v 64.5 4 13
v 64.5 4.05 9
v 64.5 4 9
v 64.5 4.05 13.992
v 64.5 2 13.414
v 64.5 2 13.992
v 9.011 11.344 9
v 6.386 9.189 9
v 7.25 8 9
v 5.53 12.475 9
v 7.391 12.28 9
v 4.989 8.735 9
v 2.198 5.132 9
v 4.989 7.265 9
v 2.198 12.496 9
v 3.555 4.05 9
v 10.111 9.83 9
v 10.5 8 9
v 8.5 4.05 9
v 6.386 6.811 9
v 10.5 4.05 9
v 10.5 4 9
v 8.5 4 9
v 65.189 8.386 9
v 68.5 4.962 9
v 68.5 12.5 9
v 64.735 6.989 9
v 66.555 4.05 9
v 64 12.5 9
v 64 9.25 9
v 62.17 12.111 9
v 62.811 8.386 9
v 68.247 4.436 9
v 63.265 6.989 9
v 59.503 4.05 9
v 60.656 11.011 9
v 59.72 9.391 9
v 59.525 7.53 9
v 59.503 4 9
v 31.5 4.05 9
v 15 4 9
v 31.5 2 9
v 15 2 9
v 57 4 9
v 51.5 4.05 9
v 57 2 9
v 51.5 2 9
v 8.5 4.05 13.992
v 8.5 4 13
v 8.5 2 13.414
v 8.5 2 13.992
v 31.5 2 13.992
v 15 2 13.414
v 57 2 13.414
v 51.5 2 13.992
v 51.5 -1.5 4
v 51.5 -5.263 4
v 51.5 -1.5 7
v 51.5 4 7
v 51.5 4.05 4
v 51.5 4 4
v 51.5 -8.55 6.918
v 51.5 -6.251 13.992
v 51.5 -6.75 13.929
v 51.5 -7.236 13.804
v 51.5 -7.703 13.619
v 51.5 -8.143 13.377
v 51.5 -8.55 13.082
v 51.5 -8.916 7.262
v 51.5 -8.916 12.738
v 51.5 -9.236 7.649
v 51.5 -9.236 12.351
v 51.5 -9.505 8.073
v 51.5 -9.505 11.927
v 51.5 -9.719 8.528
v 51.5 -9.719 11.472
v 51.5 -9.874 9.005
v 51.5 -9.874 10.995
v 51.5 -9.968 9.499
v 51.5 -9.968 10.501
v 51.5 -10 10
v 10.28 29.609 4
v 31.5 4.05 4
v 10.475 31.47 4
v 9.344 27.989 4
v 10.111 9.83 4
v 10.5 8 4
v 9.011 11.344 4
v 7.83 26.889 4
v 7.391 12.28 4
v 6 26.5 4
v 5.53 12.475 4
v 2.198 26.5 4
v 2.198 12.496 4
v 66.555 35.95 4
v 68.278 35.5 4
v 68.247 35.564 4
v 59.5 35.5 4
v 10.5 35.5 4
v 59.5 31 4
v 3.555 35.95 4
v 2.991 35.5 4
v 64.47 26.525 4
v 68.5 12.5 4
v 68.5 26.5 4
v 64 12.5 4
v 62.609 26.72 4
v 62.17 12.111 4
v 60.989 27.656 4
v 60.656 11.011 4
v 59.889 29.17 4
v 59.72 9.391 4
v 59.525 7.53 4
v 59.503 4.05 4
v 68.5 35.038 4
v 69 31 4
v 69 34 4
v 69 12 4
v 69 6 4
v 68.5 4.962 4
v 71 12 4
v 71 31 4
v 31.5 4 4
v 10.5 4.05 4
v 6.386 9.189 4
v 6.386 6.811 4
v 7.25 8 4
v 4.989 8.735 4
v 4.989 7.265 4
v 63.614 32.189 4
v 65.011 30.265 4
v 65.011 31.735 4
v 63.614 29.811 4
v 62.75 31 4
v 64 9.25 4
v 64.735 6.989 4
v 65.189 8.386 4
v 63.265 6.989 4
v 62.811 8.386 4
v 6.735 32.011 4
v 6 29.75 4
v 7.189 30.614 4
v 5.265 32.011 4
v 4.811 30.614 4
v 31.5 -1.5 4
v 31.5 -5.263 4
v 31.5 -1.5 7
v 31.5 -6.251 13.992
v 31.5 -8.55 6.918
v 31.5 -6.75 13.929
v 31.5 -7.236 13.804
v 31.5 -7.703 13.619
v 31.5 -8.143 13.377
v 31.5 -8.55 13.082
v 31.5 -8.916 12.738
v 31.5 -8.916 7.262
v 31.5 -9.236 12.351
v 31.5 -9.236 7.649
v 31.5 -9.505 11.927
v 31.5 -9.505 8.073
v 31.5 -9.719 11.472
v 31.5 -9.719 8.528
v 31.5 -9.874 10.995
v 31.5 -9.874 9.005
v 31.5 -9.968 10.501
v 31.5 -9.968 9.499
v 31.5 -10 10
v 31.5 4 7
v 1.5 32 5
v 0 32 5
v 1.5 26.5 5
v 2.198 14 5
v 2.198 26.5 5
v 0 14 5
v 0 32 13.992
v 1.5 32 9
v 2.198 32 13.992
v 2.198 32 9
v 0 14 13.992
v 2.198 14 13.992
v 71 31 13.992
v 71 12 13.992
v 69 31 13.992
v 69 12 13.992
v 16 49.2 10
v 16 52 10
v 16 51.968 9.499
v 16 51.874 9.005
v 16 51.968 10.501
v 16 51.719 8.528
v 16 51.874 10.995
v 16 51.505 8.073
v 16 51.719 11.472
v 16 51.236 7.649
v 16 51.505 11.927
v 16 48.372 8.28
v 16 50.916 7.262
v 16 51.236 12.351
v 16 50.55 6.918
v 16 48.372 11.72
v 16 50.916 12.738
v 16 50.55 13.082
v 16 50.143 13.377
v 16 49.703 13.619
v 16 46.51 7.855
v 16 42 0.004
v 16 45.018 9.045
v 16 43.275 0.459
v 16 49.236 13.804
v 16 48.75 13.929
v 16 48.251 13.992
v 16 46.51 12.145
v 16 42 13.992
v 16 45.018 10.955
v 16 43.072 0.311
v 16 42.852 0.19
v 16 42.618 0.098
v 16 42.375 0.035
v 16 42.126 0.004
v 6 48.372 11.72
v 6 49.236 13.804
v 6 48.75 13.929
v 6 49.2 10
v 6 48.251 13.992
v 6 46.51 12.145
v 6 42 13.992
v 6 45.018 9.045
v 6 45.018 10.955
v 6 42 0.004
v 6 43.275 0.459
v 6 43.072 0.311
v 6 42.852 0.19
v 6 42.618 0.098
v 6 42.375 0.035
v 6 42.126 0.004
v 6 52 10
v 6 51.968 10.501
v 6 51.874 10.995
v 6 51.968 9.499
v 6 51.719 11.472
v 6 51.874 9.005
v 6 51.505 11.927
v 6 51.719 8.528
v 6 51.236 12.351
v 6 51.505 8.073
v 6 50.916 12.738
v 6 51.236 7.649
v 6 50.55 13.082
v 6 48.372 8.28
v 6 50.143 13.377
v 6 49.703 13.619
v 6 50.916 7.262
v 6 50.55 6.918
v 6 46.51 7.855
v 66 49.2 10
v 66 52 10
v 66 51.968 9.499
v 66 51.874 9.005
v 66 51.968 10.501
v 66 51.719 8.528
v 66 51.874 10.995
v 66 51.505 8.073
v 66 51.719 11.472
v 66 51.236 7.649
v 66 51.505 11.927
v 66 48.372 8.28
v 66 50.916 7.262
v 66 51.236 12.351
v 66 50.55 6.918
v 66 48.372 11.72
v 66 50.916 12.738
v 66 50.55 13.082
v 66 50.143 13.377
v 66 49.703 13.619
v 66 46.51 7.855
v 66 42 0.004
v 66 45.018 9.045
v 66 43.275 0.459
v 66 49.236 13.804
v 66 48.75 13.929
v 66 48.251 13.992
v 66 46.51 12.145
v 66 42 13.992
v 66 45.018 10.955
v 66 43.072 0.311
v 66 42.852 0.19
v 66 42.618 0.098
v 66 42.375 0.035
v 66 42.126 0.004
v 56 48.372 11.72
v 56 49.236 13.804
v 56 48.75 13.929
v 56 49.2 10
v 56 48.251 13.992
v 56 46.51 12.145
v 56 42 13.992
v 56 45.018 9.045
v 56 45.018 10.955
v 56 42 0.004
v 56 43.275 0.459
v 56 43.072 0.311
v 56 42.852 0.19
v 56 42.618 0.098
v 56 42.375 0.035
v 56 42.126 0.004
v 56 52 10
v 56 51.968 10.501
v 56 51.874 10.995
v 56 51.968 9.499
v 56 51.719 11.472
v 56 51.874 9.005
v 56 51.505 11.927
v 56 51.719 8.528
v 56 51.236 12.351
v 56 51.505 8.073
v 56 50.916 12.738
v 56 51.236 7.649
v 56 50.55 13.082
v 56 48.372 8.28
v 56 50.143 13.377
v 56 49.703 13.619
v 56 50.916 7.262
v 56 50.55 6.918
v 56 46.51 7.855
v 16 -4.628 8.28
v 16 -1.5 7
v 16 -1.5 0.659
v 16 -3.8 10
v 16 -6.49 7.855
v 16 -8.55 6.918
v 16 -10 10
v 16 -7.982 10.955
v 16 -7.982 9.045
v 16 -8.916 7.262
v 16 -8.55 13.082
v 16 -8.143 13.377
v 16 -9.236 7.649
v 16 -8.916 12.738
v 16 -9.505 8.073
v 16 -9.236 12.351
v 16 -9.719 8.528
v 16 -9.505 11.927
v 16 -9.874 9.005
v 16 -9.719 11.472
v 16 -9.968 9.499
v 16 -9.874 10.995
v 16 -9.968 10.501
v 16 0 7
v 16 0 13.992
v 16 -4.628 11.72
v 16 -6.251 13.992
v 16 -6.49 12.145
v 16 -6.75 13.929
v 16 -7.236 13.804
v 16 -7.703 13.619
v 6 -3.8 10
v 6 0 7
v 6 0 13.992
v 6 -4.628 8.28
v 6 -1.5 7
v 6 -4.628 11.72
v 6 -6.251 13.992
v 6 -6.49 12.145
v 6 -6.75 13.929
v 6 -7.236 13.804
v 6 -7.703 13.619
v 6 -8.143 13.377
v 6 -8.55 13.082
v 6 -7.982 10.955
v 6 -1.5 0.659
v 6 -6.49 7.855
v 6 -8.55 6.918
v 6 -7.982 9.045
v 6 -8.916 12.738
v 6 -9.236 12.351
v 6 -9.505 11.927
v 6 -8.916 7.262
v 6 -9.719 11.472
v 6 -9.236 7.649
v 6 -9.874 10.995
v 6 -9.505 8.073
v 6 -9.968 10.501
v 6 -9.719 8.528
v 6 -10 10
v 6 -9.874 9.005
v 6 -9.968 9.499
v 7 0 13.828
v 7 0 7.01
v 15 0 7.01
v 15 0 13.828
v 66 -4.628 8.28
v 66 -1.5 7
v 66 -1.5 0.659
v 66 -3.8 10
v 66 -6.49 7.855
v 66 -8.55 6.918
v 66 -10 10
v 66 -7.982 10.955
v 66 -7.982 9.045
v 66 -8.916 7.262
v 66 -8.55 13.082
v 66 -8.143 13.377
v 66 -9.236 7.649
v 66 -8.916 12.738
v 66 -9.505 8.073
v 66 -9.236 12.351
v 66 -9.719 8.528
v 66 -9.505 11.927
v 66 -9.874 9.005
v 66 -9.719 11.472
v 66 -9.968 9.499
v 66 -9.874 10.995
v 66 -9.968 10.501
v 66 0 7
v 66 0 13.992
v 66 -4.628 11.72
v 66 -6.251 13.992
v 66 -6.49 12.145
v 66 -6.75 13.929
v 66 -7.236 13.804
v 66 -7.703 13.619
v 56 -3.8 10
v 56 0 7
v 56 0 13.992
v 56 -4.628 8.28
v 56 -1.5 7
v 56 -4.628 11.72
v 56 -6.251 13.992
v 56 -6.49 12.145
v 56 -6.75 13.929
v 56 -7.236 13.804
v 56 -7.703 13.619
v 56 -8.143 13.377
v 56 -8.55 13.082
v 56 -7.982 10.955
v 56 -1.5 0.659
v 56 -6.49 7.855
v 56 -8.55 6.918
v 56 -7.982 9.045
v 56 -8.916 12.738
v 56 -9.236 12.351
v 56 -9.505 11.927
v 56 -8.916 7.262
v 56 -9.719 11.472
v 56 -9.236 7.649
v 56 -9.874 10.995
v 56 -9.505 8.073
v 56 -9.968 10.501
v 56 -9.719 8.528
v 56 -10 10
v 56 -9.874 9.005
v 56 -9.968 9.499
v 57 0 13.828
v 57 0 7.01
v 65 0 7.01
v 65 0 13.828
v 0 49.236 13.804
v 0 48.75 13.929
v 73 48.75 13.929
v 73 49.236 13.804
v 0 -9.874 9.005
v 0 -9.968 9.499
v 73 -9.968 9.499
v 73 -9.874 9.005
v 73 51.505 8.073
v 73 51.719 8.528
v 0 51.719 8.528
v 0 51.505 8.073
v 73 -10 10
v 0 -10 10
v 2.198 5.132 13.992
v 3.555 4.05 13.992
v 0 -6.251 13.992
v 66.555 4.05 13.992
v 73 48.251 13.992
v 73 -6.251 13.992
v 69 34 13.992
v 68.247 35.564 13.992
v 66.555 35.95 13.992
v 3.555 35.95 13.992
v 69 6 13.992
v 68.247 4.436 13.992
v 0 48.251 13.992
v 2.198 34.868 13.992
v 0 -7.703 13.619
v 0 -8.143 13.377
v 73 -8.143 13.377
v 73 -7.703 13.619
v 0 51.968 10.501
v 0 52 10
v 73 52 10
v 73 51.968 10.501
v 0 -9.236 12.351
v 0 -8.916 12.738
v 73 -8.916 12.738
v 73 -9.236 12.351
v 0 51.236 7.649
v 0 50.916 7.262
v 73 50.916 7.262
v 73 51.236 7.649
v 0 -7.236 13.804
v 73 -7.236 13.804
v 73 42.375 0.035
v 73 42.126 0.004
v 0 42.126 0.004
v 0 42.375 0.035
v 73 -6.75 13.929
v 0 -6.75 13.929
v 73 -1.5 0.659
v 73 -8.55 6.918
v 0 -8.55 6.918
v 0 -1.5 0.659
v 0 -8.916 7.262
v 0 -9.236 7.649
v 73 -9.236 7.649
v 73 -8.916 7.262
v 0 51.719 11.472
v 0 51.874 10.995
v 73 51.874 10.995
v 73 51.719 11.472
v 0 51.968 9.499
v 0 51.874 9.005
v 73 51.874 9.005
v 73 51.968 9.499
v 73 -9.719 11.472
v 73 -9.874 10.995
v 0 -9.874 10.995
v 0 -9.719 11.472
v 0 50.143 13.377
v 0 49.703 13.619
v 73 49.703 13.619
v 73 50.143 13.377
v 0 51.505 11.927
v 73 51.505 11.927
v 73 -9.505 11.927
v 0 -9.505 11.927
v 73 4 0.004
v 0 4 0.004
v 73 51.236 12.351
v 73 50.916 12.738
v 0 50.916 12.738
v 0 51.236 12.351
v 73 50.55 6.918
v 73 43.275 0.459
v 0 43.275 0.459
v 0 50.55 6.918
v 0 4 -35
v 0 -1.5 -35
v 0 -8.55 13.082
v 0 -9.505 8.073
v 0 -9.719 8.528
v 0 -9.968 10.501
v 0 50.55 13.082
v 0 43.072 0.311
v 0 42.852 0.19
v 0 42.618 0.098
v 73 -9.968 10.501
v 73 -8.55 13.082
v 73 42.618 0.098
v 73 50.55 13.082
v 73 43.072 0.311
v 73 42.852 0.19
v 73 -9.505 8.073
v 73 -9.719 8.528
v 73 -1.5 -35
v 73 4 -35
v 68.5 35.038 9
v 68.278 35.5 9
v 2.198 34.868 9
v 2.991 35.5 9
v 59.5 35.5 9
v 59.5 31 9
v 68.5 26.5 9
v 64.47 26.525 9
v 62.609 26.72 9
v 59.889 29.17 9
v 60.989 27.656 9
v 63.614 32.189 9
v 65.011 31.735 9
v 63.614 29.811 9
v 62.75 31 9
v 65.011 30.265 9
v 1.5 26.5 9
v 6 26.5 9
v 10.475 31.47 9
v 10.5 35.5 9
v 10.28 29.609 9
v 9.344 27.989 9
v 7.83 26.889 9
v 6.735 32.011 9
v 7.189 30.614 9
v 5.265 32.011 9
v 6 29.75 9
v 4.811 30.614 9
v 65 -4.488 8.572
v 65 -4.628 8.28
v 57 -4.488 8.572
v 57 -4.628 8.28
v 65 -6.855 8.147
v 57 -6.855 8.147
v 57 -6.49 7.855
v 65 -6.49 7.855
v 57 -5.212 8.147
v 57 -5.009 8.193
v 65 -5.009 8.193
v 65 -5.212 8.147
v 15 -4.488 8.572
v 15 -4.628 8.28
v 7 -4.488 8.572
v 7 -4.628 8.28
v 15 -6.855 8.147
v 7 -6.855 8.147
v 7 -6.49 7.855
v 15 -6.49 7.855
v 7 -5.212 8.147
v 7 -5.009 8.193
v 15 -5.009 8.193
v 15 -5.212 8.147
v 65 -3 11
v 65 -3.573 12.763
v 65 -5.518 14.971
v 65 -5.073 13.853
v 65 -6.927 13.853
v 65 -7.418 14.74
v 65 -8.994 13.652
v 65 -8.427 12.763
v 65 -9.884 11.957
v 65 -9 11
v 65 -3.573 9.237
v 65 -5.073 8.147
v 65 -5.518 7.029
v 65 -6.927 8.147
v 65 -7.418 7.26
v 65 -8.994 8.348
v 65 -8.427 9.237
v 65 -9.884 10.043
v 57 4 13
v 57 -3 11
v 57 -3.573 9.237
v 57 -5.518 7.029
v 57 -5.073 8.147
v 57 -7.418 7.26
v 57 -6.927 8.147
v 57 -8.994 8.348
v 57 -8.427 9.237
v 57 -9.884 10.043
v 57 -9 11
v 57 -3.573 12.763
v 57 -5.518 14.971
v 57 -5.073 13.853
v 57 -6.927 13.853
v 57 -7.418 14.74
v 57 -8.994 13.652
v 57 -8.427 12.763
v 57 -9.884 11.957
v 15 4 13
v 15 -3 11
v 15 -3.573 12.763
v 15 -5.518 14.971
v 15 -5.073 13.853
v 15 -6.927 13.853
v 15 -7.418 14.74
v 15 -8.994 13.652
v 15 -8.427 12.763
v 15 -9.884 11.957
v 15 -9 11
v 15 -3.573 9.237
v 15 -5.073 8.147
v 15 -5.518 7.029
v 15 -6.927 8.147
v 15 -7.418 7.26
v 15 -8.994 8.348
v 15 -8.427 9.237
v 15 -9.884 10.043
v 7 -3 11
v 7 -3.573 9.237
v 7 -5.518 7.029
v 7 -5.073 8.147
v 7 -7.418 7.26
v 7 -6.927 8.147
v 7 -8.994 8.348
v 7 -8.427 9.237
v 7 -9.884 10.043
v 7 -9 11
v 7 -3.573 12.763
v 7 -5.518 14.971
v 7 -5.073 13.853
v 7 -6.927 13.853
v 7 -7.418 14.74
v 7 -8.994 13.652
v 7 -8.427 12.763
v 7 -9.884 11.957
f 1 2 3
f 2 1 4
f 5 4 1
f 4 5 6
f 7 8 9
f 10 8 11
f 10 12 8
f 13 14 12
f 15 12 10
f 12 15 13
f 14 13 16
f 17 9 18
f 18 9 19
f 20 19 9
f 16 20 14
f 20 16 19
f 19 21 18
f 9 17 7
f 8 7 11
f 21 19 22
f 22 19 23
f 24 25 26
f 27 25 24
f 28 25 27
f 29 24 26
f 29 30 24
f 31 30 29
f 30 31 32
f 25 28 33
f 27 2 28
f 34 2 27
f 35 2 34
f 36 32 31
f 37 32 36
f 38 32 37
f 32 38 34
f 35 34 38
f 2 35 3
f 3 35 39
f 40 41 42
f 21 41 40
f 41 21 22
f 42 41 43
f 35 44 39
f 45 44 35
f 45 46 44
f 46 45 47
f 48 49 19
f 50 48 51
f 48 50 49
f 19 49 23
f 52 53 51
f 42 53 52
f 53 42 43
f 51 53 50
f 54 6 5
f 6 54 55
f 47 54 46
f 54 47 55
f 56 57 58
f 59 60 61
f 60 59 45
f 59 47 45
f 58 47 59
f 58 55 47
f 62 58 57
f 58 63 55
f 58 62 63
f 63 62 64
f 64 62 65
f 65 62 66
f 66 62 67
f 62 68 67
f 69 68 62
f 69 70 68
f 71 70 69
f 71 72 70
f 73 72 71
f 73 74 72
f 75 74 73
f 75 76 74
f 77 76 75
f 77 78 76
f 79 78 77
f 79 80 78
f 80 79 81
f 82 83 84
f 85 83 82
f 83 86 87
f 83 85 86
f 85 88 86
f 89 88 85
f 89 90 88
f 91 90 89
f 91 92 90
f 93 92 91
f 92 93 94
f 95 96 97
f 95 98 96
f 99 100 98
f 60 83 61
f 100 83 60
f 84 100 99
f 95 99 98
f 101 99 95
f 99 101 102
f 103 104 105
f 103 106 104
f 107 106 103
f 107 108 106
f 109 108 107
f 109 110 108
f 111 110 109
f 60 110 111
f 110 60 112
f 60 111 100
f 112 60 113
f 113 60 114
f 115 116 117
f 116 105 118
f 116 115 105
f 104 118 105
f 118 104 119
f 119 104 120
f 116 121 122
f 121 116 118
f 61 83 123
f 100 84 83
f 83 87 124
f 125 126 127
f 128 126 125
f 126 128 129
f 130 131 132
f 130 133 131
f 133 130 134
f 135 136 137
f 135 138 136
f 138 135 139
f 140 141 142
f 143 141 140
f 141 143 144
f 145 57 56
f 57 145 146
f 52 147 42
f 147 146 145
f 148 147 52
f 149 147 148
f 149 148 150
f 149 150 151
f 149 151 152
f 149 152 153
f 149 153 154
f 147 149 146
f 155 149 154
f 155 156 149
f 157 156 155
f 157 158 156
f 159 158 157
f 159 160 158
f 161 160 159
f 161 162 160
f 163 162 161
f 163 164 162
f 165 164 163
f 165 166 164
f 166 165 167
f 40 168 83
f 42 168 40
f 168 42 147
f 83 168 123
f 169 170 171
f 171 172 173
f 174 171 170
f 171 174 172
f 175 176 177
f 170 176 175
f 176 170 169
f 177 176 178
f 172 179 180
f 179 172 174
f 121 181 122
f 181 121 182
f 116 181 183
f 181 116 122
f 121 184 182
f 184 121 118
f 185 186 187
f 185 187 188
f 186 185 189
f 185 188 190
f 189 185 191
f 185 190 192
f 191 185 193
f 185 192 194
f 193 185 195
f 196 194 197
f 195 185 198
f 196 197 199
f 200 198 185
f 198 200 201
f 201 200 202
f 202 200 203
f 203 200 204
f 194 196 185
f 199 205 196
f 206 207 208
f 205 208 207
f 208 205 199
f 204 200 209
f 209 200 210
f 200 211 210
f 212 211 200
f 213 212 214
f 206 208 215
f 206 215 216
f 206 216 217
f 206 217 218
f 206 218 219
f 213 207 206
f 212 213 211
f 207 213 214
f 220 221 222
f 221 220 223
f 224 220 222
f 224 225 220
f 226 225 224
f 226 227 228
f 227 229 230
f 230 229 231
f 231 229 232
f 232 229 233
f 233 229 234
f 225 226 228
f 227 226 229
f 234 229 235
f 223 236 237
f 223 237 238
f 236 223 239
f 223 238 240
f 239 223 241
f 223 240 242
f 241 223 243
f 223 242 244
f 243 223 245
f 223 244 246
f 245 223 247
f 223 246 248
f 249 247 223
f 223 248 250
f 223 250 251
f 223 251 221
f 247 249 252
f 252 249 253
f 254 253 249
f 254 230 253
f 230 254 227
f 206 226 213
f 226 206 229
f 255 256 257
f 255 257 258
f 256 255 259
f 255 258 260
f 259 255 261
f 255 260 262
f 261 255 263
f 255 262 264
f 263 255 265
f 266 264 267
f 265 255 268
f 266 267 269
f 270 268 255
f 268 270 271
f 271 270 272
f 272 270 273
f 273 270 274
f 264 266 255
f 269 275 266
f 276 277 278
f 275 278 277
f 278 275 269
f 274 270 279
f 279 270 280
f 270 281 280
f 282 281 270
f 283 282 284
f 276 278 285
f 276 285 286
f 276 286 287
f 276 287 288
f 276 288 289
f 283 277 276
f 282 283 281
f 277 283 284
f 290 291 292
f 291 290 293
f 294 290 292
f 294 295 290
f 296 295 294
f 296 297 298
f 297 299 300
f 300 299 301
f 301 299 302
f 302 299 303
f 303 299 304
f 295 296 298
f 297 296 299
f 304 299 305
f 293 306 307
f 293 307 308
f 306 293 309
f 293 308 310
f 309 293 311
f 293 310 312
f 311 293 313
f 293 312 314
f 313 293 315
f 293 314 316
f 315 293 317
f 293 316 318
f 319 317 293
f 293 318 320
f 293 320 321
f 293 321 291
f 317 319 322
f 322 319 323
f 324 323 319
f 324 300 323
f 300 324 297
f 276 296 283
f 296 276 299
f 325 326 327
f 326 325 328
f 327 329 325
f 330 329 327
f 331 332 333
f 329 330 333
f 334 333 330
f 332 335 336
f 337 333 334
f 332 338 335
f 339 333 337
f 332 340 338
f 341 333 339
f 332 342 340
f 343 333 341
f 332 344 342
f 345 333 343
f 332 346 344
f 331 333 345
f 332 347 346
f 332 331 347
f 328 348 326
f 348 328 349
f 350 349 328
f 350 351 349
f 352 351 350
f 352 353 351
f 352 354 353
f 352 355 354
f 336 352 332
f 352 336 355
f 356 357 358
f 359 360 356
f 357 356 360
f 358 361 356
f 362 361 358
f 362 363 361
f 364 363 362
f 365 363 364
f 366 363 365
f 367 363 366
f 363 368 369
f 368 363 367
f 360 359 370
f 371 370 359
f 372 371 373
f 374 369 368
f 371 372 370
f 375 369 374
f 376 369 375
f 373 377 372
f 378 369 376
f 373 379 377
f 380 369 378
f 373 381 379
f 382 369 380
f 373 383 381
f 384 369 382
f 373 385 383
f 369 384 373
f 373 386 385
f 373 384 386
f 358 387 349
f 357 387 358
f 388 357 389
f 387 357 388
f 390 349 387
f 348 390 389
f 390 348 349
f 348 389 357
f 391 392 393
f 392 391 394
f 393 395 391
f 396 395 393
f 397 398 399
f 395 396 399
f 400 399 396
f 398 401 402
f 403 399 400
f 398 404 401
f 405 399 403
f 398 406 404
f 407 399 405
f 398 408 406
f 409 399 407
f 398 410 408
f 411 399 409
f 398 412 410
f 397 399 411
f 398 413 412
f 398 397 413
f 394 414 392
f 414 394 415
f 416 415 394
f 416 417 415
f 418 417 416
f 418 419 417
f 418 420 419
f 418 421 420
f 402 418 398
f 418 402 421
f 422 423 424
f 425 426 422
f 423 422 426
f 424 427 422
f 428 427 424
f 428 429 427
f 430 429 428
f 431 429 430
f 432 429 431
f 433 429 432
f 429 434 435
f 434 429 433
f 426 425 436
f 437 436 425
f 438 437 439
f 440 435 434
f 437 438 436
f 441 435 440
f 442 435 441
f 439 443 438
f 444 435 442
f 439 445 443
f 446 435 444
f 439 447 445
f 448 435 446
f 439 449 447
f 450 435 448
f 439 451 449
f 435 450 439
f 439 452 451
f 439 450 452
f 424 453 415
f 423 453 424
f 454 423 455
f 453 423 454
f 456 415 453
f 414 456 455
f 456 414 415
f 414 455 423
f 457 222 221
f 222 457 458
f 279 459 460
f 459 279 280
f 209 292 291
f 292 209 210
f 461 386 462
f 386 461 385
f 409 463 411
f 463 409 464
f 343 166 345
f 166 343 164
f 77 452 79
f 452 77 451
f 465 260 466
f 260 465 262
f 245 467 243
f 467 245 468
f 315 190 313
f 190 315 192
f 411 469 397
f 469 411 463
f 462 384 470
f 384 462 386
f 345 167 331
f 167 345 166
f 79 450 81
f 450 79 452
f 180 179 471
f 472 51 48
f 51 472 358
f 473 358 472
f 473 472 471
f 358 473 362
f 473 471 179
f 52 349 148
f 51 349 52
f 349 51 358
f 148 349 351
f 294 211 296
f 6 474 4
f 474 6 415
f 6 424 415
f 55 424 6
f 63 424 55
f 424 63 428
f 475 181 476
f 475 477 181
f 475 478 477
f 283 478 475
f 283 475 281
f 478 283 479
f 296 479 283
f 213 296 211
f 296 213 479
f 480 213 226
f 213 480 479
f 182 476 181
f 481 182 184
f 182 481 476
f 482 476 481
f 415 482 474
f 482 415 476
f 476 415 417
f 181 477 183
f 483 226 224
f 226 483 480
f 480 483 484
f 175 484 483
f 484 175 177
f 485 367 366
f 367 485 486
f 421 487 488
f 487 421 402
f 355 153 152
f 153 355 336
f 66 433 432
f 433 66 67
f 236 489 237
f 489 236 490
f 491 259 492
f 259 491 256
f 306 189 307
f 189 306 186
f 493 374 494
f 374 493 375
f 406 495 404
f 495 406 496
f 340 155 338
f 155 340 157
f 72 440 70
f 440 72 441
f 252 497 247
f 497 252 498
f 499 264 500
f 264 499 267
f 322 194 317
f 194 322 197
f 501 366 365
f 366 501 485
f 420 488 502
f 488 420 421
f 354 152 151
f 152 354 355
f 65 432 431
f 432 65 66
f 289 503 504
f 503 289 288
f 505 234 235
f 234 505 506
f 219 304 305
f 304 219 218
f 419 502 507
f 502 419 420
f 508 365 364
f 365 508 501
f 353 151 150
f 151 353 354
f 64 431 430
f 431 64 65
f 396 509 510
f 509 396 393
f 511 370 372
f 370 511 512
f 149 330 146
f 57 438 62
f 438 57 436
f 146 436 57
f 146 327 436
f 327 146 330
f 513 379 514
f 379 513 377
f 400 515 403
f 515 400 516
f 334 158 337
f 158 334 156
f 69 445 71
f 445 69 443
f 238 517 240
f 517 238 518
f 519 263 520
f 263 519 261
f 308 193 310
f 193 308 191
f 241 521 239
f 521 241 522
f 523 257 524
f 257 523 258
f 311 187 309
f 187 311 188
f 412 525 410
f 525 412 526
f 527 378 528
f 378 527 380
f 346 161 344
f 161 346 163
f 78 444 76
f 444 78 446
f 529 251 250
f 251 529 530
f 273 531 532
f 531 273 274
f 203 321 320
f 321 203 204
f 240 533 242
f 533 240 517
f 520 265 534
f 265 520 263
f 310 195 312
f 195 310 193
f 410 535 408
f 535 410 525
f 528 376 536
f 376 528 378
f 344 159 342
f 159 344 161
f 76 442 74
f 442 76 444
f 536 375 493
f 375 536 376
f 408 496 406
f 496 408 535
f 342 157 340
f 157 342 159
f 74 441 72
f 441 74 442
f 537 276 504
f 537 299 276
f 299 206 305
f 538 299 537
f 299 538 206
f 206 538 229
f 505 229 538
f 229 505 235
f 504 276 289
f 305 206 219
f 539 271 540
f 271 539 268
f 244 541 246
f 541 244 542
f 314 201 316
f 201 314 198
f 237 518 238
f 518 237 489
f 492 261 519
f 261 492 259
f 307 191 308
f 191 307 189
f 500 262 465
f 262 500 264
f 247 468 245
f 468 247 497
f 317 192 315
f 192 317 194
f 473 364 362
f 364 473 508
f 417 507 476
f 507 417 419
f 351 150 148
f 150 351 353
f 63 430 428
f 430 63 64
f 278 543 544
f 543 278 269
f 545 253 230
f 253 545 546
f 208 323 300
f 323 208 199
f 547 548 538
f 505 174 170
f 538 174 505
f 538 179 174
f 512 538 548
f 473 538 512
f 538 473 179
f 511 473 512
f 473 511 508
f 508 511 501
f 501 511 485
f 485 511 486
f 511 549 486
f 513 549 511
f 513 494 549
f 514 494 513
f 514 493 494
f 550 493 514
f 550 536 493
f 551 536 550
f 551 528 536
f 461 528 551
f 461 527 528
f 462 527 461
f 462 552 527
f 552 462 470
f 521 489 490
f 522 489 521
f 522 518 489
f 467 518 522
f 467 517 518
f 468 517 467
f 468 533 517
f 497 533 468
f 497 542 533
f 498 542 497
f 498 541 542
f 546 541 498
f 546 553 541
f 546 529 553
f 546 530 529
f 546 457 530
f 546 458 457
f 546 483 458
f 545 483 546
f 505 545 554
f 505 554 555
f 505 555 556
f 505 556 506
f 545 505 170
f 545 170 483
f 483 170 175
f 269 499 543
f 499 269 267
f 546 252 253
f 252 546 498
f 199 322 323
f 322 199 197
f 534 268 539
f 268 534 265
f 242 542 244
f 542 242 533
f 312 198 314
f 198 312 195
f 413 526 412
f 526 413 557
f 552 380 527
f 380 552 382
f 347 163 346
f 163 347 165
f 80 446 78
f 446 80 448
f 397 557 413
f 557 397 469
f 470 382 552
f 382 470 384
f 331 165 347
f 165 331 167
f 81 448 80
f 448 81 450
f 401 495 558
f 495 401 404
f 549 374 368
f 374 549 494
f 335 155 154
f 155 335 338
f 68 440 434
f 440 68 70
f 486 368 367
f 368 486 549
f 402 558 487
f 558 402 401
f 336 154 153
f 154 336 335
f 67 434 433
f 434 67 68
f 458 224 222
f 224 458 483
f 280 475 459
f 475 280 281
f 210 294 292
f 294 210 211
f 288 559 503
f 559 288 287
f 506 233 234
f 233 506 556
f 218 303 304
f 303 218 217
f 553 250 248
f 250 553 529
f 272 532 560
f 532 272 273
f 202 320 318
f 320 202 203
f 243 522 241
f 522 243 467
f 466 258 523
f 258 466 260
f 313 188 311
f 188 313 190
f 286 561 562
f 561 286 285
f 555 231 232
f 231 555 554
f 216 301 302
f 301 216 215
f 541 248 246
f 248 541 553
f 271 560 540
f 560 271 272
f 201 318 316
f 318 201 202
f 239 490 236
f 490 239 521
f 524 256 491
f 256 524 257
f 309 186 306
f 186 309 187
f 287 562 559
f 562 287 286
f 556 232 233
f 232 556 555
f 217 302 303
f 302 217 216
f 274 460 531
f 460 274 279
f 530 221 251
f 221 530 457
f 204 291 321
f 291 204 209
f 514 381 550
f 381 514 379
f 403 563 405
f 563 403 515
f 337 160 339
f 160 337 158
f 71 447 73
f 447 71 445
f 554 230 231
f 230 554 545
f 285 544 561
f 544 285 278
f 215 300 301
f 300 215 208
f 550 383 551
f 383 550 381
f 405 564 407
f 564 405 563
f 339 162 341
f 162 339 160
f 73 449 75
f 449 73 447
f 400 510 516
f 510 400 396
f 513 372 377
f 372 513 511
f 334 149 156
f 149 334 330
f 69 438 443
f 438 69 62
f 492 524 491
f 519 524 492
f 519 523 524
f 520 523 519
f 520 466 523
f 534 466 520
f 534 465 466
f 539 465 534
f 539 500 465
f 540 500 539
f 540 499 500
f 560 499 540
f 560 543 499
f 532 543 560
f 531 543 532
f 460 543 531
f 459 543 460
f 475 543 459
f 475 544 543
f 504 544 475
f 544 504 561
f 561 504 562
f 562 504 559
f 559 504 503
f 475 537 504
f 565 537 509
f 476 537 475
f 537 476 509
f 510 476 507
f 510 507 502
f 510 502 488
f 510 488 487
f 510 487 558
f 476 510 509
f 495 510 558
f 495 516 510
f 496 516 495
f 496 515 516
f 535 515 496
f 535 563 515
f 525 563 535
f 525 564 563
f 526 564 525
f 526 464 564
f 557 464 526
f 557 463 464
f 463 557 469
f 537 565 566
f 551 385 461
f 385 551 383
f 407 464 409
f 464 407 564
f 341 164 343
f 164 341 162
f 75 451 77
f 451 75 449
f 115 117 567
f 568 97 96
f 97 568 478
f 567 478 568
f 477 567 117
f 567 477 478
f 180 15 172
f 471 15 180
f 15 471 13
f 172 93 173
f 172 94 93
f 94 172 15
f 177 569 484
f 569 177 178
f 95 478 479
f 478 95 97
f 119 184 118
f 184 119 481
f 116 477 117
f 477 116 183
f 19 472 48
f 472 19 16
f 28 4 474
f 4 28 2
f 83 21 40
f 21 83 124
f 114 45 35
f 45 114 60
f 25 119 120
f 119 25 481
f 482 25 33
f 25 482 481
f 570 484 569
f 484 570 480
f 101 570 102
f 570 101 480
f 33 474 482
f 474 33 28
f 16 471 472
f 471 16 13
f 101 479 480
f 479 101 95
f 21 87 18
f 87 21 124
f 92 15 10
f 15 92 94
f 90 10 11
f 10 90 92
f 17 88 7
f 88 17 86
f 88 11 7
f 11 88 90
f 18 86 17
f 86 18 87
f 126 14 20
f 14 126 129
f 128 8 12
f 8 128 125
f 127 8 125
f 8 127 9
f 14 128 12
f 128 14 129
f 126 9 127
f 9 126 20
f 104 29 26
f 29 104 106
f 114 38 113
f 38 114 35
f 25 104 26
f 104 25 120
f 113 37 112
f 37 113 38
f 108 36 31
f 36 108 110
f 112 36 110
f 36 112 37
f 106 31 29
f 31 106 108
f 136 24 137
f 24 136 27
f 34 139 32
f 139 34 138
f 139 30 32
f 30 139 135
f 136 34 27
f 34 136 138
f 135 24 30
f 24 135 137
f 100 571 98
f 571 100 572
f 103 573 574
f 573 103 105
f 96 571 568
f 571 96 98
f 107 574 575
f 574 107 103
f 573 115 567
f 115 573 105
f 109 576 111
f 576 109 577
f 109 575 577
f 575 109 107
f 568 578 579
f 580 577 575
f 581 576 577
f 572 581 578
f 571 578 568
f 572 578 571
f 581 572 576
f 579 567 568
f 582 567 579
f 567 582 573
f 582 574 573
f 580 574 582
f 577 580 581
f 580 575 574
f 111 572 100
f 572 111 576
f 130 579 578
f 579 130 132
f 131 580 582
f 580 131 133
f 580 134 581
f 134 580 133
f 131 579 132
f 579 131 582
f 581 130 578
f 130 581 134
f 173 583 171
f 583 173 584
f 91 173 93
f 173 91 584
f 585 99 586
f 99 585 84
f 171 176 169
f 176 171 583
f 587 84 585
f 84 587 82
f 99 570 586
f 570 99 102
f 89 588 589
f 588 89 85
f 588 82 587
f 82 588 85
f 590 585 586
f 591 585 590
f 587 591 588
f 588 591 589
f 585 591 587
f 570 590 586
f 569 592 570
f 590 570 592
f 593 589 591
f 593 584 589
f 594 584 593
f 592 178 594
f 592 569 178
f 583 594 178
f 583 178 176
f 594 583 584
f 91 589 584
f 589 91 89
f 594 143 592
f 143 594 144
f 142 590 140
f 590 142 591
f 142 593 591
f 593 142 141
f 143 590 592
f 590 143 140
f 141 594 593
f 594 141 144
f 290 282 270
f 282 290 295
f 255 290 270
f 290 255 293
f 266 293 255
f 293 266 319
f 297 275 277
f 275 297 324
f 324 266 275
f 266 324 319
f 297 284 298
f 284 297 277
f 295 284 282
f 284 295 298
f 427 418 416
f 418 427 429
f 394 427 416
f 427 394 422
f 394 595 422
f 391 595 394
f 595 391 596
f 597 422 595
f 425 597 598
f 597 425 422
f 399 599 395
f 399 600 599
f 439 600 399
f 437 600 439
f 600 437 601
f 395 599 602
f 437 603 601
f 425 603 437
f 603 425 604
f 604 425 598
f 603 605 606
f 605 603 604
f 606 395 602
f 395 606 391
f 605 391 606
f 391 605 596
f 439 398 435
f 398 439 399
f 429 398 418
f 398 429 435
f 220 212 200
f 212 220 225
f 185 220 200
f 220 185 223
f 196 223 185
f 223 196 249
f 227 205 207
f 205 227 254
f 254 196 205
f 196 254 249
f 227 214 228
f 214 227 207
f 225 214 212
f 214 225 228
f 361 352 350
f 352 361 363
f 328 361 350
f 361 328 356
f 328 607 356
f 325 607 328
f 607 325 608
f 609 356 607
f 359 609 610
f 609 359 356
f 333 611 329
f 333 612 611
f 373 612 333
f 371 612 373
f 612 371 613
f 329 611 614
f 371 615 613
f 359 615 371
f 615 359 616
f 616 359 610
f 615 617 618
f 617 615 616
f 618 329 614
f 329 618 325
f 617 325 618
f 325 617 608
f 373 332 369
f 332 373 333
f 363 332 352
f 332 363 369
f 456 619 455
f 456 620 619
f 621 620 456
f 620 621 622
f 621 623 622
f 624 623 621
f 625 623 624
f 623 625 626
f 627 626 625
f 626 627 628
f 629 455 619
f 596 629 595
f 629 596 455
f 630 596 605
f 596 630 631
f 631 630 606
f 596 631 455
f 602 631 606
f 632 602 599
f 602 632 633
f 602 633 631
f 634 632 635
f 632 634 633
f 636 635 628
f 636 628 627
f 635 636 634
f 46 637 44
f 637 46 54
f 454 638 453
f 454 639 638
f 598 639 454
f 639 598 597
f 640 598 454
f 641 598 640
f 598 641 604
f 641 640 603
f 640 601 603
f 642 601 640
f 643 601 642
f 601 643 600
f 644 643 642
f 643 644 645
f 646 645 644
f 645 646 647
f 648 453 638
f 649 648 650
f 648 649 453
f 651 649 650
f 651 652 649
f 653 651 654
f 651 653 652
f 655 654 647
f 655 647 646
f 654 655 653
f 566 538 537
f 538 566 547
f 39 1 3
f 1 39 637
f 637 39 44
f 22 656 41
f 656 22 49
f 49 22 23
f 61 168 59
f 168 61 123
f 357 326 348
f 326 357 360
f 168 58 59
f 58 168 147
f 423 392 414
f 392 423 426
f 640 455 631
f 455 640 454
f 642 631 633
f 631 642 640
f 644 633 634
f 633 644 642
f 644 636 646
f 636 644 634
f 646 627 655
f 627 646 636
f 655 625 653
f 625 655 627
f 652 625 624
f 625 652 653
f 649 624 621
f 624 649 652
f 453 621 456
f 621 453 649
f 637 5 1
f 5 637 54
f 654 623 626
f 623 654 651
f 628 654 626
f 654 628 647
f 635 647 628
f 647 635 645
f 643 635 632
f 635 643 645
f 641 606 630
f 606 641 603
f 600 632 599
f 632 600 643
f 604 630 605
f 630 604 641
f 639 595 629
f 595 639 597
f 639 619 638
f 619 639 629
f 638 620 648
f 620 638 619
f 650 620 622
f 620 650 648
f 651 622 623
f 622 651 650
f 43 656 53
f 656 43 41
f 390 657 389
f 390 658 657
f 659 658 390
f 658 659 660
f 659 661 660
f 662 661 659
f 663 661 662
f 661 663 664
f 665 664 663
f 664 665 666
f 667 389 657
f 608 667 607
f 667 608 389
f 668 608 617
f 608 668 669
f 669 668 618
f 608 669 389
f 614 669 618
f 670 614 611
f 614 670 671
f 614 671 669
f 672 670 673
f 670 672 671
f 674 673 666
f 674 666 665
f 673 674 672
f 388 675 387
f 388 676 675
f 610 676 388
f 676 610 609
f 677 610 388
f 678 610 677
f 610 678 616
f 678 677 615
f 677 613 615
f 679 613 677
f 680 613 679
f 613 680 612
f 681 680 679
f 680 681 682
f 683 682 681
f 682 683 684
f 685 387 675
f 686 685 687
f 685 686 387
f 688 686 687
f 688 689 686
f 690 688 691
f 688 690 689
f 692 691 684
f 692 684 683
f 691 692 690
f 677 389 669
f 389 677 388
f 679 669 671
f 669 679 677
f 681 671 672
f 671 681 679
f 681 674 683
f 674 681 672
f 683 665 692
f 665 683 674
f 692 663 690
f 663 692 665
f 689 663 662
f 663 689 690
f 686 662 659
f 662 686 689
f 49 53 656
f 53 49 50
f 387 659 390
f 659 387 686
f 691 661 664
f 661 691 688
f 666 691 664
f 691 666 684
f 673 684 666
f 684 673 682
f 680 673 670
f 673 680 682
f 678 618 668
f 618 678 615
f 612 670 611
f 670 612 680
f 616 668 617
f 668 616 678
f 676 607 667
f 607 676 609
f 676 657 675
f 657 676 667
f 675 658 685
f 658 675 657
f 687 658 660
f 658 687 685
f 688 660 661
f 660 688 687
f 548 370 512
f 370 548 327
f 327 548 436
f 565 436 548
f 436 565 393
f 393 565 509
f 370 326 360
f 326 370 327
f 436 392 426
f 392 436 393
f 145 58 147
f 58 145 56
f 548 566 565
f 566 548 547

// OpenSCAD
show_base = true;
show_cap = true;
show_face = false;
cap_rotate_angle = 90;
face_rotate_angle = 0;

module __Customizer_Limit__ () {}

small_base_radius = 2;
big_base_radius = 4;


rpi0_screw_width = 58;
rpi0_screw_height = 23;

rpi0_width = 65;
rpi0_height = 30;
rpi0_buffer = 1;
bay_depth = 10;
base_thickness = 4;
bay_buffer = 2;
bay_start_h = 2;
bay_start_v = 4;

screw_diameter = 1.25;
screw_mount_dia = 3.5;
screw_mount_height = 5;

hinge_width = 8;
hinge_buffer = 1;
hinge_inset = 10;
hinge_1_height = 10;
hinge_1_offset = 49;
hinge_1_location = rpi0_height + rpi0_buffer*2 + bay_buffer*2 + bay_start_v*2 + 3;
hinge_2_location = -6;
base_length = rpi0_width + rpi0_buffer*2 + bay_buffer*2 + bay_start_h*2 - 2;




union()
{
  if ( show_base )
  {
    difference()
    {
      base();
      bay();
      gaps();
      hinge_bays();
     }
    rpi0();
    hinge_axles();
  }
  if ( show_cap )
  {
    translate([0, hinge_2_location, hinge_1_height])
    rotate([cap_rotate_angle,0,0])
    translate([0, -hinge_2_location, -hinge_1_height])
    cap();
  }

  if ( show_face )
  {
    translate([0, hinge_1_location, hinge_1_height])
    rotate([face_rotate_angle,0,0])
    translate([0, -hinge_1_location, -hinge_1_height])
    face();
  }

 // translate([-7,-75.5,8])
 // rotate([-90,90,0])
 // front_plate();
}



module front_plate()
union()
{
  translate([0,0,2])
  cylinder(h = 16, r = 1.75);
  translate([0,0,58])
  cylinder( h = 16, r = 1.75);
  
  union()
  {
    hinges();
  }
}


module face()
union()
{
    rotate([90, 90, 90])
    face_hinges();
    face_top();
}

module face_hinges()
union()
{
  translate([-10, 47, 57])
  hinge();

  translate([-10, 47, 7])
  hinge();

}

module face_top()
union()
{
  face_top_width = 80;
  translate([0,hinge_2_location + 57,0])
  cube([base_length, face_top_width, 5.5]);
}


module cap()
union()
{
    rotate([90, 90, 90])
    cap_hinges();
    cap_top();
}

module cap_hinges()
union()
{
  translate([-10,-5,65])
  rotate([180,0,0])
  hinge();

  translate([-10,-5,15])
  rotate([180,0,0])
  hinge();

}

module cap_top()
{
  cap_top_width = rpi0_height + bay_buffer*2 + bay_start_v*2;
  translate([0,hinge_2_location - 45,0])
  cube([base_length, cap_top_width, 5.5]);
}


module hinge_axles()
{
  union()
  {
    translate([0, 0, hinge_1_height])
    union()
    {

      translate([hinge_1_offset + 3, hinge_1_location])
      rotate([90,0,90])
      cylinder(h = 14, r = 2.2);

      translate([hinge_1_offset + 3, hinge_2_location])
      rotate([90,0,90])
      cylinder(h = 14, r = 2.2);

      translate([4, hinge_1_location])
      rotate([90,0,90])
      cylinder(h = 14, r = 2.2);

      translate([4, hinge_2_location])
      rotate([90,0,90])
      cylinder(h = 14, r = 2.2);

    }
  }
}

module hinge_bays()
union()
{
  translate([6, 42])
  cube([hinge_width + hinge_buffer*2, hinge_inset, base_thickness + bay_depth]);

  translate([56,42])
  cube([hinge_width + hinge_buffer*2, hinge_inset, base_thickness + bay_depth]);


  translate([6, -10])
  cube([hinge_width + hinge_buffer*2, hinge_inset, base_thickness + bay_depth]);

  translate([56,-10])
  cube([hinge_width + hinge_buffer*2, hinge_inset, base_thickness + bay_depth]);
}

module screw_mount()
difference()
{
  linear_extrude(screw_mount_height)
  hull() {
    mount_size = rpi0_buffer + screw_mount_dia;
    circle(mount_size);
    polygon([[-mount_size, mount_size], [-mount_size,-mount_size], [mount_size,-mount_size]]);
  }
  cylinder(r = screw_diameter, h = screw_mount_height + 1);
}


module rpi0()
union()
{
  translate([rpi0_buffer,rpi0_buffer, base_thickness])
  union()
    {
    in_height = rpi0_screw_height;
    in_width = rpi0_screw_width;
    start_x = bay_buffer + bay_start_h + rpi0_buffer;
    start_y = bay_buffer + bay_start_v + rpi0_buffer;
      
    translate([start_x, start_y])
    rotate(0)
    screw_mount();

    translate([in_width + start_x, start_y])
    rotate(90)
    screw_mount();

    translate([start_x + in_width, start_y + in_height])
    rotate(180)
    screw_mount();

    translate([start_x, (in_height + start_y)])
    rotate(270)
    screw_mount();
  }
}

module gaps()
union()
{
  union()
  {
    starts_at_h = bay_buffer + bay_start_h;
    starts_at_v = bay_buffer + bay_start_v;
    solo_usb_offset = 5;
    
    front_gap_w = 56;
    // usb side
    translate([(rpi0_width/2 - front_gap_w/2) + starts_at_h, (starts_at_v - 4), base_thickness + screw_mount_height])
    cube([front_gap_w, 6, bay_depth]);

    // usb port gap
    translate([starts_at_h + rpi0_width/2 - solo_usb_offset, -(starts_at_v + 5), base_thickness])
    cube([20,20,bay_depth]);

    // sd card slot
    translate([starts_at_h - 9, rpi0_height/2 - 1, screw_mount_height])
    cube([18,18,bay_depth]);
    
    // ribbon cable
    translate([(rpi0_width + bay_buffer*2 - 1),rpi0_height/2 - 3,  base_thickness])
    cube([3,19,bay_depth]);
  }
}

module hinge()
union()
{
  linear_extrude(hinge_width)
  difference()
  {
    hull()
    {
      circle(r = 4);
  
      translate([4,-2,62])
      square(1);
  
      translate([9,-2,62])
      square(1);

      translate([9,3,62])
      square(1);
    } 
    circle(r = 3);
  }
}

module bay()
union()
{
  bay_width = rpi0_width + rpi0_buffer*2 - small_base_radius*2;
  bay_height = rpi0_height + rpi0_buffer*2 - small_base_radius*2;
  
  translate([bay_buffer + bay_start_h, bay_buffer + bay_start_v, base_thickness])
  linear_extrude(bay_depth)
  hull() {
    circle(small_base_radius);
    translate([bay_width,0]) circle(small_base_radius);
    translate([bay_width,bay_height]) circle(small_base_radius);
    translate([0,bay_height]) circle(small_base_radius);
  }
}
  

module base()
union() {
  $fn=50;

  rotate([90, 0, 90])
  translate([0, small_base_radius, 0])
  linear_extrude(base_length)
  hull() {
    circle(2);
    translate([42,0]) circle(small_base_radius);
    translate([48,8]) circle(big_base_radius);
    translate([-6,8]) circle(big_base_radius);
  }
}
